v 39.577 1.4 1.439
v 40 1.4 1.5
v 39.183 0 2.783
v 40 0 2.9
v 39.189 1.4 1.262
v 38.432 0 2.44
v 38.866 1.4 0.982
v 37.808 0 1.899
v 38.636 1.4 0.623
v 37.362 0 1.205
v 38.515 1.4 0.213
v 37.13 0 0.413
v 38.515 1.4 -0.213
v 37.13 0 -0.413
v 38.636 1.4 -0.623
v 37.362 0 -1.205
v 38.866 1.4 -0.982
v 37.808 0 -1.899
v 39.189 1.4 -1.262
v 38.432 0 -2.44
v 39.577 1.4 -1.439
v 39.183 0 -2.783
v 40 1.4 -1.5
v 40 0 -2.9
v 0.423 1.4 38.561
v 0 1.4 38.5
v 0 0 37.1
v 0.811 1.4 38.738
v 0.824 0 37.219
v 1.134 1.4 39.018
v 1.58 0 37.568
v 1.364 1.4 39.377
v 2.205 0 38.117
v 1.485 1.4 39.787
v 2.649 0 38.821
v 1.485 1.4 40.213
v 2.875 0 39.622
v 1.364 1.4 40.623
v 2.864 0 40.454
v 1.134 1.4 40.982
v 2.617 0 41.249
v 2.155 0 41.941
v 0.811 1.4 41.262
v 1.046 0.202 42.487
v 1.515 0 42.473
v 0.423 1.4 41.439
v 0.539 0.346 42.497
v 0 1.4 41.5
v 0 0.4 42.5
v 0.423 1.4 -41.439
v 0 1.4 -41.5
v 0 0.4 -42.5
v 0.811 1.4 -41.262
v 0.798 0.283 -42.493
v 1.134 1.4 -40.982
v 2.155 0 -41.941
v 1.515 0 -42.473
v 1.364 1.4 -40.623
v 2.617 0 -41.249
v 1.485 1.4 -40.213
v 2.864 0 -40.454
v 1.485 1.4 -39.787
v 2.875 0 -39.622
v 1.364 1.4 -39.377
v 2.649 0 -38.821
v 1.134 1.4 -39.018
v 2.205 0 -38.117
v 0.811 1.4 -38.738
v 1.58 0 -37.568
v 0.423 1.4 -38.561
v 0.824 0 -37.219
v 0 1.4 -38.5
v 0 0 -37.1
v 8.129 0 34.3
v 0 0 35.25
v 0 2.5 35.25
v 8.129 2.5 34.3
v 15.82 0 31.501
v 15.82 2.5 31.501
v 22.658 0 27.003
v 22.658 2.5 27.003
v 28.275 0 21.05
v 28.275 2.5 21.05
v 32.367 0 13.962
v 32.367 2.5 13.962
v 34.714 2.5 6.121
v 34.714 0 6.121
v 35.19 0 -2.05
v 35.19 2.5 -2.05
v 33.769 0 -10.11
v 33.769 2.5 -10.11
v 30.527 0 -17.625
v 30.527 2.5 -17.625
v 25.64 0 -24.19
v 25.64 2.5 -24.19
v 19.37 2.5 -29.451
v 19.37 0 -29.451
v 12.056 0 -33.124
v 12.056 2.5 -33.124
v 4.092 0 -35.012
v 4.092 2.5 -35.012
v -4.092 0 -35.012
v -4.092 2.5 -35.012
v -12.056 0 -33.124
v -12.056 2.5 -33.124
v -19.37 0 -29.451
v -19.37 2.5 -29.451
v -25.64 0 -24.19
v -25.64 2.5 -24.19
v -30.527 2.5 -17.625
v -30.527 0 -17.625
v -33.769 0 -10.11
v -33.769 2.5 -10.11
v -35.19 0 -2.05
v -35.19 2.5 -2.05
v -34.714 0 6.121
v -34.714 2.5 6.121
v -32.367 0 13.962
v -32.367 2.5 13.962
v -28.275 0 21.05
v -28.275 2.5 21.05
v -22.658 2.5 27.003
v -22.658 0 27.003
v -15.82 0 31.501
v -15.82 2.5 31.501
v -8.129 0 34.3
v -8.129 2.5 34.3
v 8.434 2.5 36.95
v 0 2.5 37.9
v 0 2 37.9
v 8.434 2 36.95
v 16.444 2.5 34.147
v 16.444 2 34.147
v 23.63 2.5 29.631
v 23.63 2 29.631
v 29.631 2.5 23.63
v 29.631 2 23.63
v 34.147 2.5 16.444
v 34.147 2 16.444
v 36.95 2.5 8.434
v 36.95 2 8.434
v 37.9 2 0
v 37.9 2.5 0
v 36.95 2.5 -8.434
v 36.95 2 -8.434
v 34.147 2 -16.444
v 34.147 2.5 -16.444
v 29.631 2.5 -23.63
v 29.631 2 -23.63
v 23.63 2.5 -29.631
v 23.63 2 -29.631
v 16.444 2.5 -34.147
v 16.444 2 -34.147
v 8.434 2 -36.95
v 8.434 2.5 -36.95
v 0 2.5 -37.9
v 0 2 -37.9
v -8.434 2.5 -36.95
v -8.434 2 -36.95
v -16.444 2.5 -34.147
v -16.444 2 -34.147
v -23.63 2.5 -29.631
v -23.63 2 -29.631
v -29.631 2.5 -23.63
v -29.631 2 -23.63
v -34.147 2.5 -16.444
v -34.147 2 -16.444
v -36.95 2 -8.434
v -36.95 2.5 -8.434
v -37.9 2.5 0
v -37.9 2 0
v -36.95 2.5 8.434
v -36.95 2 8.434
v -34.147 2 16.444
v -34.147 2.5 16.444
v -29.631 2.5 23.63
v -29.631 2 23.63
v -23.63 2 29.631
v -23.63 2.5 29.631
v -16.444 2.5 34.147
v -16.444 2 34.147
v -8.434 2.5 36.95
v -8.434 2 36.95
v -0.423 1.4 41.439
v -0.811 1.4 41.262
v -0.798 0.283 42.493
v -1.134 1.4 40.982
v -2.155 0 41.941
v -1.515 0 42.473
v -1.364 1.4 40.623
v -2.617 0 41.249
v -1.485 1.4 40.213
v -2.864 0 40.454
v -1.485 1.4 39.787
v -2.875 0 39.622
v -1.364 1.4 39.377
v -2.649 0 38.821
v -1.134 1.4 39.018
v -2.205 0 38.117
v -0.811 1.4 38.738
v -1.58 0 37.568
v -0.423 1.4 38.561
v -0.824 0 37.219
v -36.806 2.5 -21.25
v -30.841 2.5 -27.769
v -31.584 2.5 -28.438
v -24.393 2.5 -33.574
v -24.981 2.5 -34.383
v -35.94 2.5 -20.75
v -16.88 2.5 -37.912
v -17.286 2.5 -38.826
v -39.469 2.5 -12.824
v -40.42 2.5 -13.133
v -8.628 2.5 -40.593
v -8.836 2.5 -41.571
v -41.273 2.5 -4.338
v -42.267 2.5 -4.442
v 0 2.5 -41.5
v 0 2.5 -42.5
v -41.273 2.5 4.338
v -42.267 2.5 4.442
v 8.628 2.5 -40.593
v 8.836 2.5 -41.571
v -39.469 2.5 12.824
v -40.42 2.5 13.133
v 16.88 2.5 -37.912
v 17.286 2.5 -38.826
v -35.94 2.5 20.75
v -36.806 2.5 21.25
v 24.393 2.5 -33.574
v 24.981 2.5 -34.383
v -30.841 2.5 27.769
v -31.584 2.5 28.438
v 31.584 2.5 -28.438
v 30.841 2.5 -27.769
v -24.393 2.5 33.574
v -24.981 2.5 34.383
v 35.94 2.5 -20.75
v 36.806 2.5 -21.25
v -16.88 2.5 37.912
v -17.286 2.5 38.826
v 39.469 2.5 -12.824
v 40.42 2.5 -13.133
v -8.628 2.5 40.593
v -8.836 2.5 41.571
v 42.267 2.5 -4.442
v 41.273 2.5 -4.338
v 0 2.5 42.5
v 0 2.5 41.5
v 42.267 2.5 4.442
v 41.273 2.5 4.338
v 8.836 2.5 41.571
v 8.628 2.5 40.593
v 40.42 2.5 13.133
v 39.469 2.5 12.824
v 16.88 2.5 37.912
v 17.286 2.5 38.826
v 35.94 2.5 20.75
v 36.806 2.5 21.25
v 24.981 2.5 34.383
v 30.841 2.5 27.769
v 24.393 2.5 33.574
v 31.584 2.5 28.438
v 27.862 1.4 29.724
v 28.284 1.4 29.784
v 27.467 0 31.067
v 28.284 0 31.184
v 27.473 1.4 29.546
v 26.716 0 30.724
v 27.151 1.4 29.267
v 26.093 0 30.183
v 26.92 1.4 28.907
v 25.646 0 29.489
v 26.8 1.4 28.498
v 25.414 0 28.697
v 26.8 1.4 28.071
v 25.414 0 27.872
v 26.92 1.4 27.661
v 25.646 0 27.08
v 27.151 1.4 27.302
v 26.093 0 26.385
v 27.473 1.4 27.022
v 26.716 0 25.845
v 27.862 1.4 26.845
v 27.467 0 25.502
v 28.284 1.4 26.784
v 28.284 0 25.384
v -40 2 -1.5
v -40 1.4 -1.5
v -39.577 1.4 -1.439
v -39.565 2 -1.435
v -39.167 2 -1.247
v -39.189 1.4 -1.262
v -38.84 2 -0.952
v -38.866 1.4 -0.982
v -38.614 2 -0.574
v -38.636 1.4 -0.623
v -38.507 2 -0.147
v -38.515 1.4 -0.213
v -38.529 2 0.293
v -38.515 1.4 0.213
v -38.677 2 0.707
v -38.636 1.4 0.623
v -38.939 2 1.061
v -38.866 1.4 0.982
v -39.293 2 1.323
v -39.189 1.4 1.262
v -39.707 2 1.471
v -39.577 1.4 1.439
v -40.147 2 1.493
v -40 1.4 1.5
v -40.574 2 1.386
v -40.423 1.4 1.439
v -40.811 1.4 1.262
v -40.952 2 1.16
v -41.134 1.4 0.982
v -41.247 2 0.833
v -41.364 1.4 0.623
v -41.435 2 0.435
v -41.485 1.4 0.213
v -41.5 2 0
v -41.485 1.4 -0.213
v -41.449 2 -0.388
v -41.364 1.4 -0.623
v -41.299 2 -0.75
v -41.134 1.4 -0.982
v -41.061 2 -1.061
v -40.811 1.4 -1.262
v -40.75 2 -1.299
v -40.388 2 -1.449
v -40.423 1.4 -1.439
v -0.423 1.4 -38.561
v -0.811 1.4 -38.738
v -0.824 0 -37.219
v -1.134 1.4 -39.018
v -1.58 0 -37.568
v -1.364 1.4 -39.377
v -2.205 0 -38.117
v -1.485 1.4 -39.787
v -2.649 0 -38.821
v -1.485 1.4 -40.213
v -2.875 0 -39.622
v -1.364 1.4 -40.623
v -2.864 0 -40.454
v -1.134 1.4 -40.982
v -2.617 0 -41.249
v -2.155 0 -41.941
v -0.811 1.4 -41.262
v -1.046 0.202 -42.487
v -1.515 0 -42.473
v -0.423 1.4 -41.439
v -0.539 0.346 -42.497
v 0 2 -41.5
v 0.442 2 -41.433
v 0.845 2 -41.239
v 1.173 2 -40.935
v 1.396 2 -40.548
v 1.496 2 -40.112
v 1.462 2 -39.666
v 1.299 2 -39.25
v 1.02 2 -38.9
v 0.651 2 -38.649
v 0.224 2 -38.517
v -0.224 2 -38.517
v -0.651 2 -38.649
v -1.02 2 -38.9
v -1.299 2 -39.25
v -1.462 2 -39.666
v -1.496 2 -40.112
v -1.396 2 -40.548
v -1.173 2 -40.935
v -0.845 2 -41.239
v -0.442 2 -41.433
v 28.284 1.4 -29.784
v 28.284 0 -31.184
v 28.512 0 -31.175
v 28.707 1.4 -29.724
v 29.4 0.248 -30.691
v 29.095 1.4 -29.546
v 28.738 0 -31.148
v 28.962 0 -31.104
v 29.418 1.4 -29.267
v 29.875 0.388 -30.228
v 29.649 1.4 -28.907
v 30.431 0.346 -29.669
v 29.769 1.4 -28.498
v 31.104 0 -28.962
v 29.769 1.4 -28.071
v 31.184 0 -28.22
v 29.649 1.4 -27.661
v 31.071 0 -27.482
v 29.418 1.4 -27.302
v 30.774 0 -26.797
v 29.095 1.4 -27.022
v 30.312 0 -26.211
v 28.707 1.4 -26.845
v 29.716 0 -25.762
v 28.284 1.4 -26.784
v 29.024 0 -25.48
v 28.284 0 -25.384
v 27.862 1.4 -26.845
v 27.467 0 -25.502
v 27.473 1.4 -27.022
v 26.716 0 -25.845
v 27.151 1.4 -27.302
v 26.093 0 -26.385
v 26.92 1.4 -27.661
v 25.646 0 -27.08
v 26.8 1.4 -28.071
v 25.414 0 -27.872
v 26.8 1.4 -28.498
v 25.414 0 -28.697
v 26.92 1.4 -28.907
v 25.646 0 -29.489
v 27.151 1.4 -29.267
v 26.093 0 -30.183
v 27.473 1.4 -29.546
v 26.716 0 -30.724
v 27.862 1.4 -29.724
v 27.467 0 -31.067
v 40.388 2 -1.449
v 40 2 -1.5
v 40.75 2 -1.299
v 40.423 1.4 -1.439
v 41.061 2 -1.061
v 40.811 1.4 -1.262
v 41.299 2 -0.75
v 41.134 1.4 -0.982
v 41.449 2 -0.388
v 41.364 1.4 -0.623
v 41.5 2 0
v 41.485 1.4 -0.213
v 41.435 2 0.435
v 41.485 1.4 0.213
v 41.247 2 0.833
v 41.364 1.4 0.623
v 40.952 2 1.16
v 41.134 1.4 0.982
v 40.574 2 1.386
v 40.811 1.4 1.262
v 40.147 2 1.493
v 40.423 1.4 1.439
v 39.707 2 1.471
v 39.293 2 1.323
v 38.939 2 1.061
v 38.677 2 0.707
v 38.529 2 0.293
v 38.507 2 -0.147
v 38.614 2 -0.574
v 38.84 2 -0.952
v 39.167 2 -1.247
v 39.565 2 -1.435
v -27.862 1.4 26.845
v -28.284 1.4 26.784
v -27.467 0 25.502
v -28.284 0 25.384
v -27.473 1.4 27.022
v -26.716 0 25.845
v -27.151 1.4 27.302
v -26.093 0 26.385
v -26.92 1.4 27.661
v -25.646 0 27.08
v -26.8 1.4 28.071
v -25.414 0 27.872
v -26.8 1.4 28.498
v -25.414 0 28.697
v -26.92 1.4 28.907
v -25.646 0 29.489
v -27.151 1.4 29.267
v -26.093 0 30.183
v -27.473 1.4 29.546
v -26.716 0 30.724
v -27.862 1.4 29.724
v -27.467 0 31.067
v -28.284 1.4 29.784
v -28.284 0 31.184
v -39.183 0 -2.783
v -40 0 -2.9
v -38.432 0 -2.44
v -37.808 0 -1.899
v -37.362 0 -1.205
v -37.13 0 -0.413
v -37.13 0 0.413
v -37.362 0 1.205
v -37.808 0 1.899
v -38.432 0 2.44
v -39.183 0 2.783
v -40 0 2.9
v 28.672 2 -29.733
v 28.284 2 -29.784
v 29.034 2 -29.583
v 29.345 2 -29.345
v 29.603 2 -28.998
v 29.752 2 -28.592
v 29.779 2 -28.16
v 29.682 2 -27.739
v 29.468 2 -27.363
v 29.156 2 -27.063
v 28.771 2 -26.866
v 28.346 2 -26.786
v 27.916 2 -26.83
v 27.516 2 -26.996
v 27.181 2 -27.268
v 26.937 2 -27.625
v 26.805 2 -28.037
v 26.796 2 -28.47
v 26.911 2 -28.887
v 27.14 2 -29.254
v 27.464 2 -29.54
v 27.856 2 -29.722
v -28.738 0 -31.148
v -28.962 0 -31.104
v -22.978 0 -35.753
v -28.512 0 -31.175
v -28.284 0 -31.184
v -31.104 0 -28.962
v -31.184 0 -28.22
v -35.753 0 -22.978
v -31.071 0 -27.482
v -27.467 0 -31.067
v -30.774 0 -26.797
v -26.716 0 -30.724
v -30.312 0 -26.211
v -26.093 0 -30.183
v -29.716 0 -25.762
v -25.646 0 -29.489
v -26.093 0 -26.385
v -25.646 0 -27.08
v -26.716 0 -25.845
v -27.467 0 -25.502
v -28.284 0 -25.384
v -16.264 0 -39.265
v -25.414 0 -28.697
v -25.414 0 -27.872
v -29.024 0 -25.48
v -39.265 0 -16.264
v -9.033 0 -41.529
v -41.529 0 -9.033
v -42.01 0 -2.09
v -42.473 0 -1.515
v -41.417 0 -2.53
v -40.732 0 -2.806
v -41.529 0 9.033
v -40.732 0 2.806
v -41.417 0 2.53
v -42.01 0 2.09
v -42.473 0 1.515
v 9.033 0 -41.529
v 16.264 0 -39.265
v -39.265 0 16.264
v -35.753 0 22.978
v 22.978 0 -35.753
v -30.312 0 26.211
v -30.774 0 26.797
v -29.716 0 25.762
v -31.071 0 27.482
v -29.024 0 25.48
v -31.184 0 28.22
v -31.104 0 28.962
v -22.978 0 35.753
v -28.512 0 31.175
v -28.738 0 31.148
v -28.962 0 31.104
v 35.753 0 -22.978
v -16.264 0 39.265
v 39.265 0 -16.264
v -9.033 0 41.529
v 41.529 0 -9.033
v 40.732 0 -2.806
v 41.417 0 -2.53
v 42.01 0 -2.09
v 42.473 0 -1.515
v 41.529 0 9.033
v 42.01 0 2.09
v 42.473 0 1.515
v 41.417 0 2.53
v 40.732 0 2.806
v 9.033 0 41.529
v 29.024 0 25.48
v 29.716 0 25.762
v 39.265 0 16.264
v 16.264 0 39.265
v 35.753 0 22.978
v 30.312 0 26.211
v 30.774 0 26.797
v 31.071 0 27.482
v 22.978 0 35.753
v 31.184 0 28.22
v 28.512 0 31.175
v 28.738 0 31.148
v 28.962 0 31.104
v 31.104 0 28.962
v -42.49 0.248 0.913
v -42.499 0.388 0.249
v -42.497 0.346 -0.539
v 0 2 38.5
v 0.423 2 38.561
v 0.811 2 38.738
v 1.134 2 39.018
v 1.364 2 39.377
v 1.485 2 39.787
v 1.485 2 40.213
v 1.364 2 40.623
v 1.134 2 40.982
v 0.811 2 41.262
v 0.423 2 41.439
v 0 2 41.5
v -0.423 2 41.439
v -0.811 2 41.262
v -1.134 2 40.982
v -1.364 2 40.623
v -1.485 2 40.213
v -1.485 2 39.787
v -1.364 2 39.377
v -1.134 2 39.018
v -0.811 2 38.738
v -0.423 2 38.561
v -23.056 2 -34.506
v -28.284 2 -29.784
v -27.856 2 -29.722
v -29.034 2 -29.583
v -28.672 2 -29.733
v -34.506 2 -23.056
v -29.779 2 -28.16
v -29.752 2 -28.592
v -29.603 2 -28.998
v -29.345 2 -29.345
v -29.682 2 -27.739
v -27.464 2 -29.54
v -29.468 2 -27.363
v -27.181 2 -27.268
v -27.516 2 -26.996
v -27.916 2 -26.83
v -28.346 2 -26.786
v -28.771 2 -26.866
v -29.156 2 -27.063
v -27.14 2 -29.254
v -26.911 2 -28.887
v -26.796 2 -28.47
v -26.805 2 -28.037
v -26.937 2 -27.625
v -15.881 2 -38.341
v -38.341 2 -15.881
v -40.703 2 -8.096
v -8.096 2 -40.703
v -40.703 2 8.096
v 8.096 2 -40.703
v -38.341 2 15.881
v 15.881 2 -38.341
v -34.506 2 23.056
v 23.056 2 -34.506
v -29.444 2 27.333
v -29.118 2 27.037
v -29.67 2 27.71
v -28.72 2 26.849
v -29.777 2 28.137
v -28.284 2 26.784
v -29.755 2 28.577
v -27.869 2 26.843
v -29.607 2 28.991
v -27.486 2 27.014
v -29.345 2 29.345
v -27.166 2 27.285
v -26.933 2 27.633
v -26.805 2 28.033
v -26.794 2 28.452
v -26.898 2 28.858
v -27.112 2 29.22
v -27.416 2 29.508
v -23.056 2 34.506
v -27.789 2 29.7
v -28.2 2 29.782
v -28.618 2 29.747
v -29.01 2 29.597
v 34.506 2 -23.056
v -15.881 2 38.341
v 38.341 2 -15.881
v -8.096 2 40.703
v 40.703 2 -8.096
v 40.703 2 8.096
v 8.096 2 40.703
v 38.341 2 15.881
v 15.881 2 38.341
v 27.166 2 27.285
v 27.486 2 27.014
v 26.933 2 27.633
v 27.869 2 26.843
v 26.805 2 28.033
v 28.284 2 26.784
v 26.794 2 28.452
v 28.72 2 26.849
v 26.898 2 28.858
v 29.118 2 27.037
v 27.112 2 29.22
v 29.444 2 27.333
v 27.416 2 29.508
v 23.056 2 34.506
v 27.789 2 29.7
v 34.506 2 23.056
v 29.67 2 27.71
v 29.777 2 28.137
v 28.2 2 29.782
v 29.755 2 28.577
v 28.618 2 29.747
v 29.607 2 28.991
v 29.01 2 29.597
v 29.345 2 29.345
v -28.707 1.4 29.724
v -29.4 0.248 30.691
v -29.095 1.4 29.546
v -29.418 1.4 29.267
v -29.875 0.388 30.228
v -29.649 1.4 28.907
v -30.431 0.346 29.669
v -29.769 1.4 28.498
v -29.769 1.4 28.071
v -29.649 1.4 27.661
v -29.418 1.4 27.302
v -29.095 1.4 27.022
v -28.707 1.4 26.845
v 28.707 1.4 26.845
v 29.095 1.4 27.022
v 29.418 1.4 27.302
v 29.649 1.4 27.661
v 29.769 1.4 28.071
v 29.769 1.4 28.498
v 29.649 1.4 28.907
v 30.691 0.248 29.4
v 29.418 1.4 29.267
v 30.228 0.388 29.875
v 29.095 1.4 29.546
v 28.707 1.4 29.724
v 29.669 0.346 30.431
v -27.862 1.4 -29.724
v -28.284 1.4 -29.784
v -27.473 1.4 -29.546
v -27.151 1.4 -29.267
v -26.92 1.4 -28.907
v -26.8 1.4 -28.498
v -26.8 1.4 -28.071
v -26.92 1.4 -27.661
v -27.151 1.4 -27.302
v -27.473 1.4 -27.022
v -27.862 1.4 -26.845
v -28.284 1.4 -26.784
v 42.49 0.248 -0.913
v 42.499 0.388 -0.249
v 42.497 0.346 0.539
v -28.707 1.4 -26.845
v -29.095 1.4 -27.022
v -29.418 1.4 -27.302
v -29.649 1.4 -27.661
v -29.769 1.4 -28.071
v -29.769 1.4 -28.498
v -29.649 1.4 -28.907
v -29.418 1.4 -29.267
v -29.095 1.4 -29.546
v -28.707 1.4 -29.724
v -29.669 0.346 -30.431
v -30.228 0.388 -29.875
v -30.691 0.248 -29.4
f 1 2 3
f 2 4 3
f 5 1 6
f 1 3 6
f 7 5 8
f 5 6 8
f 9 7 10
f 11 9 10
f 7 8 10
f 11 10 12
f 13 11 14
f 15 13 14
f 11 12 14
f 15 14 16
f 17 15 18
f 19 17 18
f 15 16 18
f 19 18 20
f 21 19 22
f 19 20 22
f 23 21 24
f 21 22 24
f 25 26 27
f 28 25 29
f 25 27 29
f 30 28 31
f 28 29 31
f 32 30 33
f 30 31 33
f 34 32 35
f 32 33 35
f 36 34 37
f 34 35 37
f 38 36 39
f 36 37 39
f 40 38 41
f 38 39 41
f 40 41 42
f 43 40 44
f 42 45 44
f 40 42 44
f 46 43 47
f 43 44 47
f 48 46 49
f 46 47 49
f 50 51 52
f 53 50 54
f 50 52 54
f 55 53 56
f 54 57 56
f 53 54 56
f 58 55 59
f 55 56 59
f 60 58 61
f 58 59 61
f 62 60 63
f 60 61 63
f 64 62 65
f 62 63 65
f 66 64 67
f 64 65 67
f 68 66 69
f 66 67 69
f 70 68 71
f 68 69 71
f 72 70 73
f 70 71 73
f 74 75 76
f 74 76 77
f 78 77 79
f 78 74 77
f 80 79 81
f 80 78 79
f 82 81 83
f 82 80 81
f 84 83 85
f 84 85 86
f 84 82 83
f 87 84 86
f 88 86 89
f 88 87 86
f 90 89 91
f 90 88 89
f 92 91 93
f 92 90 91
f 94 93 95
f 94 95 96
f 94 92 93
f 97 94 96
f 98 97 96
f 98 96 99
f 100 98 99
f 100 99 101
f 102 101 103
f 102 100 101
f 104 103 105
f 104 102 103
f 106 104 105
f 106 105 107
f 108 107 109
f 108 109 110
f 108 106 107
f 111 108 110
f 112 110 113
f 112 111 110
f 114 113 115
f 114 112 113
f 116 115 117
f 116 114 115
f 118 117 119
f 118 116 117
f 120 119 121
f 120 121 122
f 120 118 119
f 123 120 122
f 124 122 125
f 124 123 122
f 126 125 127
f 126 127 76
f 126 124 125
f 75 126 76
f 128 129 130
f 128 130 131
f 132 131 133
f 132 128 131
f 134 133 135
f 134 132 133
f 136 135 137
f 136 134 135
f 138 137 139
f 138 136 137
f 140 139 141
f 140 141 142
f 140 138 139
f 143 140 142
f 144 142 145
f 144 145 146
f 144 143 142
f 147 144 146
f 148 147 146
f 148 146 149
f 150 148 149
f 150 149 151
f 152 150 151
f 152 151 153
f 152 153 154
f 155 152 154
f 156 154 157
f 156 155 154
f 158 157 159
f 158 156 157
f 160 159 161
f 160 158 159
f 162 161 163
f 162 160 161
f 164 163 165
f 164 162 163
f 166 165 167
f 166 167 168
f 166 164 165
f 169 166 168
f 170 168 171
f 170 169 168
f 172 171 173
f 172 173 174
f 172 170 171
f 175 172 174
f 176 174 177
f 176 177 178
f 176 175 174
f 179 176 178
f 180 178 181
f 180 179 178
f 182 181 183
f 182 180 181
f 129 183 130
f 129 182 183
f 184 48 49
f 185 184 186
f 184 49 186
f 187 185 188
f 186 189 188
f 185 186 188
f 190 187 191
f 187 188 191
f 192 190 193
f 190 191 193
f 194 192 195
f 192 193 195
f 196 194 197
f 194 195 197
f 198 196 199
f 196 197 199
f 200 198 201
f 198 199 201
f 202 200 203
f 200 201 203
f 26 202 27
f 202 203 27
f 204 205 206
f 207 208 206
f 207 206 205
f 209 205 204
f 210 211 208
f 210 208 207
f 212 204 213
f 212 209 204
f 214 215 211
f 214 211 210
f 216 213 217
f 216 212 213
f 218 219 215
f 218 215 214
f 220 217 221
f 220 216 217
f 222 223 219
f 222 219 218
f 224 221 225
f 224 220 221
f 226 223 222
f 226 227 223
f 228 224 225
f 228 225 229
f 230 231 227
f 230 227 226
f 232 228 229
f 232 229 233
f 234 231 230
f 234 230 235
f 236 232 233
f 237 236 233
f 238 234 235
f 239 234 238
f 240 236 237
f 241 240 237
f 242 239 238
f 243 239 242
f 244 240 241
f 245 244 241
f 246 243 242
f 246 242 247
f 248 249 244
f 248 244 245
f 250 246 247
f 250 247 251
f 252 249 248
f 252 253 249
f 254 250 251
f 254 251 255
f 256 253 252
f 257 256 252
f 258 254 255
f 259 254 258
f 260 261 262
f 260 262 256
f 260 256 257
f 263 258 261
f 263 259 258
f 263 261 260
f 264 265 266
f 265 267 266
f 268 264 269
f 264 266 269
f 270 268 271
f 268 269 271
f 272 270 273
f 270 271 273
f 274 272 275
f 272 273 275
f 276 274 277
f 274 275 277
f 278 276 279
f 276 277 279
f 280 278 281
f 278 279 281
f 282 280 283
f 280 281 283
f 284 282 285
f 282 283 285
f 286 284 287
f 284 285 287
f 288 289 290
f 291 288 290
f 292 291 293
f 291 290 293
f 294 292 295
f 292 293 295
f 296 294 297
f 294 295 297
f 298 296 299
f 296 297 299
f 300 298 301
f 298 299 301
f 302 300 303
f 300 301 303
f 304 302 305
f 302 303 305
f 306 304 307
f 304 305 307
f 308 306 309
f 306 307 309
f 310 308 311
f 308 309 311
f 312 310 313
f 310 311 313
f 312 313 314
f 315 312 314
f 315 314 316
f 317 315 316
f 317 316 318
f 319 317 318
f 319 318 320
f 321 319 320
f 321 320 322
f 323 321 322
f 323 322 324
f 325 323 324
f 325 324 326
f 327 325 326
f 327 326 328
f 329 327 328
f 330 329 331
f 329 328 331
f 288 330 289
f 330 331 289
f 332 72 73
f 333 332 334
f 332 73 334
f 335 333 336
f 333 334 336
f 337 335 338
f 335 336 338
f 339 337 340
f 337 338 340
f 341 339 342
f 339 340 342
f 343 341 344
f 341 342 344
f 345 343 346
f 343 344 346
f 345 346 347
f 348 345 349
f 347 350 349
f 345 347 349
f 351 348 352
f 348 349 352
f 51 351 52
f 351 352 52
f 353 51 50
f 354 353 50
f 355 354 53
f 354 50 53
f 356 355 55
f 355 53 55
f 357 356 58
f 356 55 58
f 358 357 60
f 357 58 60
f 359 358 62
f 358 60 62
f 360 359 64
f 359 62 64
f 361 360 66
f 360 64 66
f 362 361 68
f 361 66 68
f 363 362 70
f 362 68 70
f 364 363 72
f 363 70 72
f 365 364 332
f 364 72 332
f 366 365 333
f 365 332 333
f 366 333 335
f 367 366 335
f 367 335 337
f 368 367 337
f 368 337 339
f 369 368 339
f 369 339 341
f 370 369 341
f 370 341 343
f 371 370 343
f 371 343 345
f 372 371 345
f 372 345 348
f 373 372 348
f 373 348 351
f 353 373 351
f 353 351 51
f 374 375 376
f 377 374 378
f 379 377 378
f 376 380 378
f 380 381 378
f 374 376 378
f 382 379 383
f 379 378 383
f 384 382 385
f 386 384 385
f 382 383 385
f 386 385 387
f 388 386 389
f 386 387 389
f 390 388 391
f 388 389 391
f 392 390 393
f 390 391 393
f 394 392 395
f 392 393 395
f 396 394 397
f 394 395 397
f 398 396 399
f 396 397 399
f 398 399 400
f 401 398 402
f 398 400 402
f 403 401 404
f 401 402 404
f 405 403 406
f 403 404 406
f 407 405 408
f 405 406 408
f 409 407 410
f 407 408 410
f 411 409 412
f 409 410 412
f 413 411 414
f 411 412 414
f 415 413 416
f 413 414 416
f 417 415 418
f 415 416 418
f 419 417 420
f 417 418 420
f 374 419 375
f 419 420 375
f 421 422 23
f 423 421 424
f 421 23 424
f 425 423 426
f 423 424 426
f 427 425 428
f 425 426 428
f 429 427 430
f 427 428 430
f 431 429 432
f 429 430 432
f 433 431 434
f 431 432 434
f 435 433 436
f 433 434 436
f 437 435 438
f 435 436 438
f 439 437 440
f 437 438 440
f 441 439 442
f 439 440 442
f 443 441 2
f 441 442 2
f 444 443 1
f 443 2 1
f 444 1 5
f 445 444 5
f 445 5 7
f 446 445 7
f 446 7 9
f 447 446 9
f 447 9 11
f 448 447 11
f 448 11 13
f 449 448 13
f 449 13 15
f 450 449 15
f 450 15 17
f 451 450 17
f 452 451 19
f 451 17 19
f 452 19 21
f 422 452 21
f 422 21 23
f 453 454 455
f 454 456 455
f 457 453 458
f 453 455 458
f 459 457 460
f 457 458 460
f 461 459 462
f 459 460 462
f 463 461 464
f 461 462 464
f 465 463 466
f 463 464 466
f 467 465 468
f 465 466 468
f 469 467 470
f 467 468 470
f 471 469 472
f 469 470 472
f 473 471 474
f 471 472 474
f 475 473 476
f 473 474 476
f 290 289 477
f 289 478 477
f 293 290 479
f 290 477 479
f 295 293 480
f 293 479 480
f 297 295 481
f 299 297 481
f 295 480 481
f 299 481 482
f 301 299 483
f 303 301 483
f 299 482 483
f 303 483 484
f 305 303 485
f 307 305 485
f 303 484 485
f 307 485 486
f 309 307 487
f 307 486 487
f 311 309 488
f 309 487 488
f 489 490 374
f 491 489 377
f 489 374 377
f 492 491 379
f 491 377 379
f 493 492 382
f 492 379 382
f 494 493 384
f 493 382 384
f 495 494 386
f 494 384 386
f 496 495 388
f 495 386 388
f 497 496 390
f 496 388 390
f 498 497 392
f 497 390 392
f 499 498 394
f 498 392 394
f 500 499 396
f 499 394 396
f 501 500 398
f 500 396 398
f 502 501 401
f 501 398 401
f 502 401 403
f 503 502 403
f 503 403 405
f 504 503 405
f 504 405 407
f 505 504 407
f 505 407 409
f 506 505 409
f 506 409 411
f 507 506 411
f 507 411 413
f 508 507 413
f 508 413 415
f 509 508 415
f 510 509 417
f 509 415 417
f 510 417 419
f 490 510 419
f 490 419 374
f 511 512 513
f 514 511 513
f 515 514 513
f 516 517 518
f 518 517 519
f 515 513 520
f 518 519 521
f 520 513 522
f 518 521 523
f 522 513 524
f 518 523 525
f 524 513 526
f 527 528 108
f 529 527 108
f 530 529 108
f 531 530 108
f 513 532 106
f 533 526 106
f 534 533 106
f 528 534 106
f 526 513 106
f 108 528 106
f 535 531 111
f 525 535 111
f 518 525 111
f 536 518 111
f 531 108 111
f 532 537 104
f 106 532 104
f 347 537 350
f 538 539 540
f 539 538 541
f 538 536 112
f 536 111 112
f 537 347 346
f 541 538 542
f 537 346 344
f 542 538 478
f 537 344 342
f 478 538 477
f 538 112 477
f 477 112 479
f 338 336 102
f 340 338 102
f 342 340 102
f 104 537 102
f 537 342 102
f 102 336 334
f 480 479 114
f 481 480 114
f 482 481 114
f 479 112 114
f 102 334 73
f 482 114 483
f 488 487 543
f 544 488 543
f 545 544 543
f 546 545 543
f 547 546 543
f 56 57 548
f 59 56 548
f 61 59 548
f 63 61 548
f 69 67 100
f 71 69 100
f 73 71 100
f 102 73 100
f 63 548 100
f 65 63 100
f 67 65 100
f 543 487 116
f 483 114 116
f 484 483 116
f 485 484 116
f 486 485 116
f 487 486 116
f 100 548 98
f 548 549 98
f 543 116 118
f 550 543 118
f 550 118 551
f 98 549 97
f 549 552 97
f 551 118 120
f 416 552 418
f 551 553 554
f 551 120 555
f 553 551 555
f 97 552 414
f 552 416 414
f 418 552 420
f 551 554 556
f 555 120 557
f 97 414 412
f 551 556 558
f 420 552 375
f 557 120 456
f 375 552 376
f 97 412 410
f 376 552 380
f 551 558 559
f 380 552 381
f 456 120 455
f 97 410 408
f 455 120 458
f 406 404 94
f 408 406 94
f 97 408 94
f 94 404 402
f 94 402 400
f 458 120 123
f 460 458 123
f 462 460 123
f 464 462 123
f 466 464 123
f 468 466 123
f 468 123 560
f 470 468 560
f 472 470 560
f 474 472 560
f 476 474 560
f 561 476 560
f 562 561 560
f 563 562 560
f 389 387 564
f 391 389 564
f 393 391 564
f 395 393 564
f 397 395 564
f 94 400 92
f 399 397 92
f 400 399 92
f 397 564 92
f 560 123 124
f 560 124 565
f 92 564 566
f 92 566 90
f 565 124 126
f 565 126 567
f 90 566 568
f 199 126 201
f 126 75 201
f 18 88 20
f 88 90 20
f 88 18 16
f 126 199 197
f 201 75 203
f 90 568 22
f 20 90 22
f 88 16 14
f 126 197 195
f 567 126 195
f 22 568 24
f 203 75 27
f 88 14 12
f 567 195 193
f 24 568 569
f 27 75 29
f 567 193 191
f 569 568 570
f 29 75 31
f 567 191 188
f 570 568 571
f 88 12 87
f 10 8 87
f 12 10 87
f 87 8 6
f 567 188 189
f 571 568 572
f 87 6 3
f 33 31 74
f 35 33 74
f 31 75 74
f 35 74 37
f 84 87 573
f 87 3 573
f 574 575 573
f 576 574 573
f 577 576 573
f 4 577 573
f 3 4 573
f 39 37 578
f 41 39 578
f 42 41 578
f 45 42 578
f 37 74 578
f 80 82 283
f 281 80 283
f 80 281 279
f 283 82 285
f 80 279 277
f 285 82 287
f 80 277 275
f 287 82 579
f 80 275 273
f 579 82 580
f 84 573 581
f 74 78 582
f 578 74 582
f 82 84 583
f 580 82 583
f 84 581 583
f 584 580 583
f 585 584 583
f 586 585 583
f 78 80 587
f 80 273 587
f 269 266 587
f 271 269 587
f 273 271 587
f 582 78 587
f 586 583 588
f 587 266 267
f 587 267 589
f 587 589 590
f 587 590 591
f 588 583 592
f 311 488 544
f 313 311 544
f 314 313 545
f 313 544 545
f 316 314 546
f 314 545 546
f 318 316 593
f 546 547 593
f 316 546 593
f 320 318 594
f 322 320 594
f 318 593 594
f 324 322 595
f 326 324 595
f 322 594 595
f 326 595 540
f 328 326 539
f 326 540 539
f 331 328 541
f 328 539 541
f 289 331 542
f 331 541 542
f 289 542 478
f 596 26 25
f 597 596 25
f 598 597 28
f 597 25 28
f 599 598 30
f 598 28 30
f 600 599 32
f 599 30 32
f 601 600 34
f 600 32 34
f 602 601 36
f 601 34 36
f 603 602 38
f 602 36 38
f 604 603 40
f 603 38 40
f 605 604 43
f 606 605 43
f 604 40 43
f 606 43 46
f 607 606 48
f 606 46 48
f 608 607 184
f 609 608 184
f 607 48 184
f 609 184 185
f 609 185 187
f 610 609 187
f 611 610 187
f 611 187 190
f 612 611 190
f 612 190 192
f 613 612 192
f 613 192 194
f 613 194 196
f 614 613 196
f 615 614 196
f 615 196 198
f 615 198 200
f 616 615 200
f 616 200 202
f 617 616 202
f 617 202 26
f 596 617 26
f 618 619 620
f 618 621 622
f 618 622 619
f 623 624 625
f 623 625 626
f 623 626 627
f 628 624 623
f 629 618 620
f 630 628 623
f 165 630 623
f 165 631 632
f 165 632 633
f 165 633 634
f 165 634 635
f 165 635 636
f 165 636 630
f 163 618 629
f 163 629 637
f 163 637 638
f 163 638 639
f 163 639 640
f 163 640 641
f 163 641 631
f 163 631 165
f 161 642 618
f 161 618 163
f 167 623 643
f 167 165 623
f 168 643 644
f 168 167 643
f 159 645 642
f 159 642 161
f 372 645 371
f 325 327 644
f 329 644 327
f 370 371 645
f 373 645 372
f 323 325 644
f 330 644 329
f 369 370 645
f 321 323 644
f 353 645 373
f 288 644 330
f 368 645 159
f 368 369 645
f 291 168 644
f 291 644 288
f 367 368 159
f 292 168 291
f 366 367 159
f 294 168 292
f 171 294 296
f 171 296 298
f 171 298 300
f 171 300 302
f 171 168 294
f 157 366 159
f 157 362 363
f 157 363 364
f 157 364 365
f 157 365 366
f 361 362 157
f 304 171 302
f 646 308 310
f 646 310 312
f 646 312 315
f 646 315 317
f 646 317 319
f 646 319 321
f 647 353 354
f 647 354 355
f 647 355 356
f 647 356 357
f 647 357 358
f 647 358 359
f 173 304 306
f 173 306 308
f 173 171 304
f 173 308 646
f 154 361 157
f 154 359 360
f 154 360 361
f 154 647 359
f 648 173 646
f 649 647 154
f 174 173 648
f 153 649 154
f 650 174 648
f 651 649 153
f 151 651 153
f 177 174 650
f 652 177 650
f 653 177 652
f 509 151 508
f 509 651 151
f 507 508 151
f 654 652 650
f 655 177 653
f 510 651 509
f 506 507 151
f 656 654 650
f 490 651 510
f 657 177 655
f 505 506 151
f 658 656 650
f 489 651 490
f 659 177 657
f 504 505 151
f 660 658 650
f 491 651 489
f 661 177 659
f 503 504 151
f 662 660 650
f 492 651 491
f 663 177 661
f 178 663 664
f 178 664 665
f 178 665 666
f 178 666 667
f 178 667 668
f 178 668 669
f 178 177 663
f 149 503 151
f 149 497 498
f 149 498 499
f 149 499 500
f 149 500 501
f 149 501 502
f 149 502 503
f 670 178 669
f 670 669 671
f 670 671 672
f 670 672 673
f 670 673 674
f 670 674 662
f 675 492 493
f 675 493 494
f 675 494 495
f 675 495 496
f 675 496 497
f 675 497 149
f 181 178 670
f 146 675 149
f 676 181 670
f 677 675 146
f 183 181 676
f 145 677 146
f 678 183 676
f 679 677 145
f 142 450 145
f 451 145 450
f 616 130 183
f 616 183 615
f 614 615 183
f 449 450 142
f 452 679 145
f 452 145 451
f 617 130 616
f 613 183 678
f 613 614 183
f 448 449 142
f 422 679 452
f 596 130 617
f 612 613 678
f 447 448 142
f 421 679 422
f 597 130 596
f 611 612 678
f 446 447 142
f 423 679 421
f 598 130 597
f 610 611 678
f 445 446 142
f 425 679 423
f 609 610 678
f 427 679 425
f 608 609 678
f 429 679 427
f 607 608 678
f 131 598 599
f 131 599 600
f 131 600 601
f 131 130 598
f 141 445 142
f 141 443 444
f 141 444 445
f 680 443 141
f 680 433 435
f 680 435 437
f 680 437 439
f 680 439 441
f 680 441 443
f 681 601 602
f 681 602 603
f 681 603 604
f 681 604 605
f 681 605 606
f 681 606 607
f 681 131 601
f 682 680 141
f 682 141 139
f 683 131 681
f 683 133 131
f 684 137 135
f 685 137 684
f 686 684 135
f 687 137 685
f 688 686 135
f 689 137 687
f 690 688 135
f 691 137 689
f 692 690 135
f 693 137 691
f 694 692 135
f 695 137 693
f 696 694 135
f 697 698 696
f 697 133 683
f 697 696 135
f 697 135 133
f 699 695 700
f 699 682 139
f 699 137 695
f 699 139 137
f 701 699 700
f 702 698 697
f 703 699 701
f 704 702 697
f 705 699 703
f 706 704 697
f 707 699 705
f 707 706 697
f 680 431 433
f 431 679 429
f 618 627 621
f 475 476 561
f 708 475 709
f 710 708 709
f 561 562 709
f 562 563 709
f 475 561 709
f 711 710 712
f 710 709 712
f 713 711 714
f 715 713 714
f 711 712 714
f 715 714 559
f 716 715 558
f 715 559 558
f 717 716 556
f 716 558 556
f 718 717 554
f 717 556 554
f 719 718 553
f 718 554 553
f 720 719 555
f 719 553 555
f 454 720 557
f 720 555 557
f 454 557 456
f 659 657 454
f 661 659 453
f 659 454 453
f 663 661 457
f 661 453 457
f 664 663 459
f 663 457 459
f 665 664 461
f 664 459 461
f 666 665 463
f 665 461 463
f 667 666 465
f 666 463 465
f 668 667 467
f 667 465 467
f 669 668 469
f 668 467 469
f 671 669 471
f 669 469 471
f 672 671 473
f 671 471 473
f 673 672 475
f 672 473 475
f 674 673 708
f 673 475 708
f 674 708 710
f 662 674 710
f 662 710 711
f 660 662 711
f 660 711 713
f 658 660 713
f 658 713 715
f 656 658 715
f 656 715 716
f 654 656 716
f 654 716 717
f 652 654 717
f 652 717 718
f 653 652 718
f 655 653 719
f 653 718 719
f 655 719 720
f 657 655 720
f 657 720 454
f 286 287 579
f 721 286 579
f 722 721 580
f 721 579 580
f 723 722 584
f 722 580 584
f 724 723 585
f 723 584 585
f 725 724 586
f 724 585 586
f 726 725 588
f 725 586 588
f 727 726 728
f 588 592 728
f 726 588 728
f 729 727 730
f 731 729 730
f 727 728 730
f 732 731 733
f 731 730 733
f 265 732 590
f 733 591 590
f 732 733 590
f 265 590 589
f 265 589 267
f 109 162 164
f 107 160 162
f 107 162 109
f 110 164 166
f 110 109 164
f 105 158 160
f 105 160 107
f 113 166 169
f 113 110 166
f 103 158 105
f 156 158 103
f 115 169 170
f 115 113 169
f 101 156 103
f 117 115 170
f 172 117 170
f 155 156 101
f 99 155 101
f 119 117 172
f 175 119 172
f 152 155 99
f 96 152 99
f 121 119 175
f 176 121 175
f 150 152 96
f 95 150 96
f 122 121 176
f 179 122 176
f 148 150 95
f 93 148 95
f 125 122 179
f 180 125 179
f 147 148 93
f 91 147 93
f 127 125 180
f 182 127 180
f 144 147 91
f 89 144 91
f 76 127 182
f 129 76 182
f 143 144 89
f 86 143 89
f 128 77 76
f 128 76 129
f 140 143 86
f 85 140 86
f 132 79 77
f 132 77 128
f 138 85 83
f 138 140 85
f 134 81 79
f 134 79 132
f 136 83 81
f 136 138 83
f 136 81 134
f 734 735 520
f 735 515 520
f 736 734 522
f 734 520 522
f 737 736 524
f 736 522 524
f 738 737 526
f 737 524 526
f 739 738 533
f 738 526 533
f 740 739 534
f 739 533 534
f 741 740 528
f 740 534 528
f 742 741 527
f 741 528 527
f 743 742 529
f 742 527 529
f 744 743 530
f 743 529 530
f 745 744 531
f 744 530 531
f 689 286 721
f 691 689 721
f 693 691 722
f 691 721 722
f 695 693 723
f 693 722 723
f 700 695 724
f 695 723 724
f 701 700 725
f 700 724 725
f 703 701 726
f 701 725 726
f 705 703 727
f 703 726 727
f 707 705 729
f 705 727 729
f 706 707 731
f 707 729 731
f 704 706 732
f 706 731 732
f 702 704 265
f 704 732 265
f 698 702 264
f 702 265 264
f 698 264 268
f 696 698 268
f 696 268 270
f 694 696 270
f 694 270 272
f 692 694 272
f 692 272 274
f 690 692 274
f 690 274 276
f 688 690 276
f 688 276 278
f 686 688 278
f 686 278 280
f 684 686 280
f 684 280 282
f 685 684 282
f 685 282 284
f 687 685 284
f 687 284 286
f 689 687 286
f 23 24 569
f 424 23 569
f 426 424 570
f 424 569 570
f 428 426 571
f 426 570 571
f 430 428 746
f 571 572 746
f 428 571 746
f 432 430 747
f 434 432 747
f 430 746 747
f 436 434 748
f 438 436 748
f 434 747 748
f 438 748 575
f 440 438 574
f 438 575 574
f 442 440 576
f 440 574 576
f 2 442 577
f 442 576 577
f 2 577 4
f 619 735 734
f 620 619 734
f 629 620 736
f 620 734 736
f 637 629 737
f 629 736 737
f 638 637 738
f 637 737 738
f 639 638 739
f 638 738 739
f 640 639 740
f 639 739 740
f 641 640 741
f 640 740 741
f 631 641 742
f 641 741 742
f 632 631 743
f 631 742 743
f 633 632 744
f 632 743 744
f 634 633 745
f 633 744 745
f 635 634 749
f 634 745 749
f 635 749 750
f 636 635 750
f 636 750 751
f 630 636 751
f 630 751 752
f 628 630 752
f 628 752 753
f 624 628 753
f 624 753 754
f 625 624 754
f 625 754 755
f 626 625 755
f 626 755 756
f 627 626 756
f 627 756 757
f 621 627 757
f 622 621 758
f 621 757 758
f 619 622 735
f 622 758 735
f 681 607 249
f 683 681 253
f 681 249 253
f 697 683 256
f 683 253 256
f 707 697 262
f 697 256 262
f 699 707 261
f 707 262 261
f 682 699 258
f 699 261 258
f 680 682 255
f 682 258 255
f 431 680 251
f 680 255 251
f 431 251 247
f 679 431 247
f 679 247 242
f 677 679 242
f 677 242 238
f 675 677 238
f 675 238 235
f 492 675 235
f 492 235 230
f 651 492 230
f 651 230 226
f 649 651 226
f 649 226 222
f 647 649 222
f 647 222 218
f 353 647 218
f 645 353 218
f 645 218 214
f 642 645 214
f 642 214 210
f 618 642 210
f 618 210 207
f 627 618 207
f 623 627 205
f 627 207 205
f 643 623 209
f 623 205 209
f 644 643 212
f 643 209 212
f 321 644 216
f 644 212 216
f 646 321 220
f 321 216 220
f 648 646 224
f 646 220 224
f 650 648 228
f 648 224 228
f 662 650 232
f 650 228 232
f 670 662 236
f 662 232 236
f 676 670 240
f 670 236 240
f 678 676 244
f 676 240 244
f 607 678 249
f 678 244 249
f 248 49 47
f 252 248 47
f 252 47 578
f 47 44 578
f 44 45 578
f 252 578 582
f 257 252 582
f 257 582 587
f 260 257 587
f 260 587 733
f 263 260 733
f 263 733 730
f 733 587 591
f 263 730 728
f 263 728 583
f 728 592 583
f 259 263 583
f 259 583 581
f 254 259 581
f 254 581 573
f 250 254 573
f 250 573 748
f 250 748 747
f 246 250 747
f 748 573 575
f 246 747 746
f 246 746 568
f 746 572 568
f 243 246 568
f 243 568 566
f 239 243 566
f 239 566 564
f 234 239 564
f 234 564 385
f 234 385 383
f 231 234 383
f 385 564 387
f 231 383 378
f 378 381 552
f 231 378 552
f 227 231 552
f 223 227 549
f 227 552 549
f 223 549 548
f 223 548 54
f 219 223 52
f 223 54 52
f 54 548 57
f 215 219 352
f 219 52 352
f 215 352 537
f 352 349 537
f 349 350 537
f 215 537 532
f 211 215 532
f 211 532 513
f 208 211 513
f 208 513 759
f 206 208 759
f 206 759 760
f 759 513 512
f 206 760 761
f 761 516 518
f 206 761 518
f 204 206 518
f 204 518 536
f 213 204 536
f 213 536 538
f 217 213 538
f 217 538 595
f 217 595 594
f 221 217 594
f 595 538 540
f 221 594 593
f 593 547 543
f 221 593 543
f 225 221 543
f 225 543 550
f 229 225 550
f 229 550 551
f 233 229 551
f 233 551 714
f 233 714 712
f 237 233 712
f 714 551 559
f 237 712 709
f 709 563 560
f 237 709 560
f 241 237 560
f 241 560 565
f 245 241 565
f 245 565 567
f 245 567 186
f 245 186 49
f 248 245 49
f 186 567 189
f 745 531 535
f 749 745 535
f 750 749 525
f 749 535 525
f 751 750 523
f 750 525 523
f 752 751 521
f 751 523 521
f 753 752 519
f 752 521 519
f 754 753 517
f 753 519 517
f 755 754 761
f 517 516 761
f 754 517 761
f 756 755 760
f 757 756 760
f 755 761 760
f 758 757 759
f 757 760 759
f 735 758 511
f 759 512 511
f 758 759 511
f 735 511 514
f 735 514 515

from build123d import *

# Parameters (mm, degrees)
SKETCH_1_R          = 42.5
SKETCH_1_R_2        = 35.25
EXTRUDE_1_DEPTH     = 2.5
SKETCH_2_R          = 1.5
CUT_EXTRUDE_1_DEPTH = 61.156047078
SKETCH_3_R          = 41.5
SKETCH_3_R_2        = 37.9
CUT_EXTRUDE_2_DEPTH = 0.5


with BuildPart() as part:
    # 草图1 → 凸台-拉伸1 (new body)
    with BuildSketch(Plane(origin=(0, 0, 0), x_dir=(1, 0, 0), z_dir=(0, 1, 0))):
        with Locations(Location((0, 0, 0), (0, 0, 270))):
            Circle(SKETCH_1_R)
        with Locations(Location((0, 0, 0), (0, 0, 270))):
            Circle(SKETCH_1_R_2, mode=Mode.SUBTRACT)
    extrude(amount=EXTRUDE_1_DEPTH)

    # 草图2 → 切除-拉伸1 (cut, through all)
    with BuildSketch(Plane.XZ):
        with Locations(Location((0, 40, 0), (0, 0, 270))):
            Circle(SKETCH_2_R)
        with Locations(Location((28.284271247, 28.284271247, 0), (0, 0, 270))):
            Circle(SKETCH_2_R)
        with Locations(Location((40, 0, 0), (0, 0, 270))):
            Circle(SKETCH_2_R)
        with Locations(Location((28.284271247, -28.284271247, 0), (0, 0, 270))):
            Circle(SKETCH_2_R)
        with Locations(Location((0, -40, 0), (0, 0, 270))):
            Circle(SKETCH_2_R)
        with Locations(Location((-28.284271247, -28.284271247, 0), (0, 0, 270))):
            Circle(SKETCH_2_R)
        with Locations(Location((-40, 0, 0), (0, 0, 270))):
            Circle(SKETCH_2_R)
        with Locations(Location((-28.284271247, 28.284271247, 0), (0, 0, 270))):
            Circle(SKETCH_2_R)
    extrude(amount=-CUT_EXTRUDE_1_DEPTH, mode=Mode.SUBTRACT)

    # 草图3 → 切除-拉伸2 (cut)
    with BuildSketch(Plane(origin=(0, 2.5, 0), x_dir=(1, 0, 0), z_dir=(0, 1, 0))):
        with Locations(Location((0, 0, 0), (0, 0, 270))):
            Circle(SKETCH_3_R)
        with Locations(Location((0, 0, 0), (0, 0, 270))):
            Circle(SKETCH_3_R_2, mode=Mode.SUBTRACT)
    extrude(amount=-CUT_EXTRUDE_2_DEPTH, mode=Mode.SUBTRACT)

    # 打孔尺寸(%根据十字)槽沉头木螺钉的类型1: read off the stored shape, not the designer's step
    # 打孔尺寸(%根据十字)槽沉头木螺钉的类型1: loft between two sections, ruled curve by curve
    hole_wizard_1_from = [
        Edge.make_three_point_arc((-40, 1.4, -1.5), (-38.5, 1.4, 0), (-40, 1.4, 1.5)),
        Edge.make_three_point_arc((-40, 1.4, 1.5), (-41.5, 1.4, 0), (-40, 1.4, -1.5)),
    ]
    hole_wizard_1_to = [
        Edge.make_three_point_arc((-40, -4.3e-08, -2.900000043), (-37.099999957, -4.3e-08, 0), (-40, -4.3e-08, 2.900000043)),
        Edge.make_three_point_arc((-40, -4.3e-08, 2.900000043), (-42.900000043, -4.3e-08, 0), (-40, -4.3e-08, -2.900000043)),
    ]
    hole_wizard_1 = Solid(Shell([*[Face.make_surface_from_curves(hole_wizard_1_from[k], hole_wizard_1_to[k]) for k in range(2)], Face(Wire(hole_wizard_1_from)), Face(Wire(hole_wizard_1_to))]))
    add(hole_wizard_1, mode=Mode.SUBTRACT)

    # Hole Wizard 1 2: loft between two sections, ruled curve by curve
    hole_wizard_1_2_from = [
        Edge.make_three_point_arc((-28.284271247, 1.4, -29.784271247), (-26.784271247, 1.4, -28.284271247), (-28.284271247, 1.4, -26.784271247)),
        Edge.make_three_point_arc((-28.284271247, 1.4, -26.784271247), (-29.784271247, 1.4, -28.284271247), (-28.284271247, 1.4, -29.784271247)),
    ]
    hole_wizard_1_2_to = [
        Edge.make_three_point_arc((-28.284271247, -4.3e-08, -31.18427129), (-25.384271205, -4.3e-08, -28.284271247), (-28.284271247, -4.3e-08, -25.384271205)),
        Edge.make_three_point_arc((-28.284271247, -4.3e-08, -25.384271205), (-31.18427129, -4.3e-08, -28.284271247), (-28.284271247, -4.3e-08, -31.18427129)),
    ]
    hole_wizard_1_2 = Solid(Shell([*[Face.make_surface_from_curves(hole_wizard_1_2_from[k], hole_wizard_1_2_to[k]) for k in range(2)], Face(Wire(hole_wizard_1_2_from)), Face(Wire(hole_wizard_1_2_to))]))
    add(hole_wizard_1_2, mode=Mode.SUBTRACT)

    # Hole Wizard 1 3: loft between two sections, ruled curve by curve
    hole_wizard_1_3_from = [
        Edge.make_three_point_arc((0, 1.4, -41.5), (1.5, 1.4, -40), (0, 1.4, -38.5)),
        Edge.make_three_point_arc((0, 1.4, -38.5), (-1.5, 1.4, -40), (0, 1.4, -41.5)),
    ]
    hole_wizard_1_3_to = [
        Edge.make_three_point_arc((0, -4.3e-08, -42.900000043), (2.900000043, -4.3e-08, -40), (0, -4.3e-08, -37.099999957)),
        Edge.make_three_point_arc((0, -4.3e-08, -37.099999957), (-2.900000043, -4.3e-08, -40), (0, -4.3e-08, -42.900000043)),
    ]
    hole_wizard_1_3 = Solid(Shell([*[Face.make_surface_from_curves(hole_wizard_1_3_from[k], hole_wizard_1_3_to[k]) for k in range(2)], Face(Wire(hole_wizard_1_3_from)), Face(Wire(hole_wizard_1_3_to))]))
    add(hole_wizard_1_3, mode=Mode.SUBTRACT)

    # Hole Wizard 1 4: loft between two sections, ruled curve by curve
    hole_wizard_1_4_from = [
        Edge.make_three_point_arc((28.284271247, 1.4, -29.784271247), (29.784271247, 1.4, -28.284271247), (28.284271247, 1.4, -26.784271247)),
        Edge.make_three_point_arc((28.284271247, 1.4, -26.784271247), (26.784271247, 1.4, -28.284271247), (28.284271247, 1.4, -29.784271247)),
    ]
    hole_wizard_1_4_to = [
        Edge.make_three_point_arc((28.284271247, -4.3e-08, -31.18427129), (31.18427129, -4.3e-08, -28.284271247), (28.284271247, -4.3e-08, -25.384271205)),
        Edge.make_three_point_arc((28.284271247, -4.3e-08, -25.384271205), (25.384271205, -4.3e-08, -28.284271247), (28.284271247, -4.3e-08, -31.18427129)),
    ]
    hole_wizard_1_4 = Solid(Shell([*[Face.make_surface_from_curves(hole_wizard_1_4_from[k], hole_wizard_1_4_to[k]) for k in range(2)], Face(Wire(hole_wizard_1_4_from)), Face(Wire(hole_wizard_1_4_to))]))
    add(hole_wizard_1_4, mode=Mode.SUBTRACT)

    # Hole Wizard 1 5: loft between two sections, ruled curve by curve
    hole_wizard_1_5_from = [
        Edge.make_three_point_arc((40, 1.4, -1.5), (41.5, 1.4, 0), (40, 1.4, 1.5)),
        Edge.make_three_point_arc((40, 1.4, 1.5), (38.5, 1.4, 0), (40, 1.4, -1.5)),
    ]
    hole_wizard_1_5_to = [
        Edge.make_three_point_arc((40, -4.3e-08, -2.900000043), (42.900000043, -4.3e-08, 0), (40, -4.3e-08, 2.900000043)),
        Edge.make_three_point_arc((40, -4.3e-08, 2.900000043), (37.099999957, -4.3e-08, 0), (40, -4.3e-08, -2.900000043)),
    ]
    hole_wizard_1_5 = Solid(Shell([*[Face.make_surface_from_curves(hole_wizard_1_5_from[k], hole_wizard_1_5_to[k]) for k in range(2)], Face(Wire(hole_wizard_1_5_from)), Face(Wire(hole_wizard_1_5_to))]))
    add(hole_wizard_1_5, mode=Mode.SUBTRACT)

    # Hole Wizard 1 6: loft between two sections, ruled curve by curve
    hole_wizard_1_6_from = [
        Edge.make_three_point_arc((28.284271247, 1.4, 26.784271247), (29.784271247, 1.4, 28.284271247), (28.284271247, 1.4, 29.784271247)),
        Edge.make_three_point_arc((28.284271247, 1.4, 29.784271247), (26.784271247, 1.4, 28.284271247), (28.284271247, 1.4, 26.784271247)),
    ]
    hole_wizard_1_6_to = [
        Edge.make_three_point_arc((28.284271247, -4.3e-08, 25.384271205), (31.18427129, -4.3e-08, 28.284271247), (28.284271247, -4.3e-08, 31.18427129)),
        Edge.make_three_point_arc((28.284271247, -4.3e-08, 31.18427129), (25.384271205, -4.3e-08, 28.284271247), (28.284271247, -4.3e-08, 25.384271205)),
    ]
    hole_wizard_1_6 = Solid(Shell([*[Face.make_surface_from_curves(hole_wizard_1_6_from[k], hole_wizard_1_6_to[k]) for k in range(2)], Face(Wire(hole_wizard_1_6_from)), Face(Wire(hole_wizard_1_6_to))]))
    add(hole_wizard_1_6, mode=Mode.SUBTRACT)

    # Hole Wizard 1 7: loft between two sections, ruled curve by curve
    hole_wizard_1_7_from = [
        Edge.make_three_point_arc((0, 1.4, 38.5), (1.5, 1.4, 40), (0, 1.4, 41.5)),
        Edge.make_three_point_arc((0, 1.4, 41.5), (-1.5, 1.4, 40), (0, 1.4, 38.5)),
    ]
    hole_wizard_1_7_to = [
        Edge.make_three_point_arc((0, -4.3e-08, 37.099999957), (2.900000043, -4.3e-08, 40), (0, -4.3e-08, 42.900000043)),
        Edge.make_three_point_arc((0, -4.3e-08, 42.900000043), (-2.900000043, -4.3e-08, 40), (0, -4.3e-08, 37.099999957)),
    ]
    hole_wizard_1_7 = Solid(Shell([*[Face.make_surface_from_curves(hole_wizard_1_7_from[k], hole_wizard_1_7_to[k]) for k in range(2)], Face(Wire(hole_wizard_1_7_from)), Face(Wire(hole_wizard_1_7_to))]))
    add(hole_wizard_1_7, mode=Mode.SUBTRACT)

    # Hole Wizard 1 8: loft between two sections, ruled curve by curve
    hole_wizard_1_8_from = [
        Edge.make_three_point_arc((-28.284271247, 1.4, 26.784271247), (-26.784271247, 1.4, 28.284271247), (-28.284271247, 1.4, 29.784271247)),
        Edge.make_three_point_arc((-28.284271247, 1.4, 29.784271247), (-29.784271247, 1.4, 28.284271247), (-28.284271247, 1.4, 26.784271247)),
    ]
    hole_wizard_1_8_to = [
        Edge.make_three_point_arc((-28.284271247, -4.3e-08, 25.384271205), (-25.384271205, -4.3e-08, 28.284271247), (-28.284271247, -4.3e-08, 31.18427129)),
        Edge.make_three_point_arc((-28.284271247, -4.3e-08, 31.18427129), (-31.18427129, -4.3e-08, 28.284271247), (-28.284271247, -4.3e-08, 25.384271205)),
    ]
    hole_wizard_1_8 = Solid(Shell([*[Face.make_surface_from_curves(hole_wizard_1_8_from[k], hole_wizard_1_8_to[k]) for k in range(2)], Face(Wire(hole_wizard_1_8_from)), Face(Wire(hole_wizard_1_8_to))]))
    add(hole_wizard_1_8, mode=Mode.SUBTRACT)


solid = part.part
